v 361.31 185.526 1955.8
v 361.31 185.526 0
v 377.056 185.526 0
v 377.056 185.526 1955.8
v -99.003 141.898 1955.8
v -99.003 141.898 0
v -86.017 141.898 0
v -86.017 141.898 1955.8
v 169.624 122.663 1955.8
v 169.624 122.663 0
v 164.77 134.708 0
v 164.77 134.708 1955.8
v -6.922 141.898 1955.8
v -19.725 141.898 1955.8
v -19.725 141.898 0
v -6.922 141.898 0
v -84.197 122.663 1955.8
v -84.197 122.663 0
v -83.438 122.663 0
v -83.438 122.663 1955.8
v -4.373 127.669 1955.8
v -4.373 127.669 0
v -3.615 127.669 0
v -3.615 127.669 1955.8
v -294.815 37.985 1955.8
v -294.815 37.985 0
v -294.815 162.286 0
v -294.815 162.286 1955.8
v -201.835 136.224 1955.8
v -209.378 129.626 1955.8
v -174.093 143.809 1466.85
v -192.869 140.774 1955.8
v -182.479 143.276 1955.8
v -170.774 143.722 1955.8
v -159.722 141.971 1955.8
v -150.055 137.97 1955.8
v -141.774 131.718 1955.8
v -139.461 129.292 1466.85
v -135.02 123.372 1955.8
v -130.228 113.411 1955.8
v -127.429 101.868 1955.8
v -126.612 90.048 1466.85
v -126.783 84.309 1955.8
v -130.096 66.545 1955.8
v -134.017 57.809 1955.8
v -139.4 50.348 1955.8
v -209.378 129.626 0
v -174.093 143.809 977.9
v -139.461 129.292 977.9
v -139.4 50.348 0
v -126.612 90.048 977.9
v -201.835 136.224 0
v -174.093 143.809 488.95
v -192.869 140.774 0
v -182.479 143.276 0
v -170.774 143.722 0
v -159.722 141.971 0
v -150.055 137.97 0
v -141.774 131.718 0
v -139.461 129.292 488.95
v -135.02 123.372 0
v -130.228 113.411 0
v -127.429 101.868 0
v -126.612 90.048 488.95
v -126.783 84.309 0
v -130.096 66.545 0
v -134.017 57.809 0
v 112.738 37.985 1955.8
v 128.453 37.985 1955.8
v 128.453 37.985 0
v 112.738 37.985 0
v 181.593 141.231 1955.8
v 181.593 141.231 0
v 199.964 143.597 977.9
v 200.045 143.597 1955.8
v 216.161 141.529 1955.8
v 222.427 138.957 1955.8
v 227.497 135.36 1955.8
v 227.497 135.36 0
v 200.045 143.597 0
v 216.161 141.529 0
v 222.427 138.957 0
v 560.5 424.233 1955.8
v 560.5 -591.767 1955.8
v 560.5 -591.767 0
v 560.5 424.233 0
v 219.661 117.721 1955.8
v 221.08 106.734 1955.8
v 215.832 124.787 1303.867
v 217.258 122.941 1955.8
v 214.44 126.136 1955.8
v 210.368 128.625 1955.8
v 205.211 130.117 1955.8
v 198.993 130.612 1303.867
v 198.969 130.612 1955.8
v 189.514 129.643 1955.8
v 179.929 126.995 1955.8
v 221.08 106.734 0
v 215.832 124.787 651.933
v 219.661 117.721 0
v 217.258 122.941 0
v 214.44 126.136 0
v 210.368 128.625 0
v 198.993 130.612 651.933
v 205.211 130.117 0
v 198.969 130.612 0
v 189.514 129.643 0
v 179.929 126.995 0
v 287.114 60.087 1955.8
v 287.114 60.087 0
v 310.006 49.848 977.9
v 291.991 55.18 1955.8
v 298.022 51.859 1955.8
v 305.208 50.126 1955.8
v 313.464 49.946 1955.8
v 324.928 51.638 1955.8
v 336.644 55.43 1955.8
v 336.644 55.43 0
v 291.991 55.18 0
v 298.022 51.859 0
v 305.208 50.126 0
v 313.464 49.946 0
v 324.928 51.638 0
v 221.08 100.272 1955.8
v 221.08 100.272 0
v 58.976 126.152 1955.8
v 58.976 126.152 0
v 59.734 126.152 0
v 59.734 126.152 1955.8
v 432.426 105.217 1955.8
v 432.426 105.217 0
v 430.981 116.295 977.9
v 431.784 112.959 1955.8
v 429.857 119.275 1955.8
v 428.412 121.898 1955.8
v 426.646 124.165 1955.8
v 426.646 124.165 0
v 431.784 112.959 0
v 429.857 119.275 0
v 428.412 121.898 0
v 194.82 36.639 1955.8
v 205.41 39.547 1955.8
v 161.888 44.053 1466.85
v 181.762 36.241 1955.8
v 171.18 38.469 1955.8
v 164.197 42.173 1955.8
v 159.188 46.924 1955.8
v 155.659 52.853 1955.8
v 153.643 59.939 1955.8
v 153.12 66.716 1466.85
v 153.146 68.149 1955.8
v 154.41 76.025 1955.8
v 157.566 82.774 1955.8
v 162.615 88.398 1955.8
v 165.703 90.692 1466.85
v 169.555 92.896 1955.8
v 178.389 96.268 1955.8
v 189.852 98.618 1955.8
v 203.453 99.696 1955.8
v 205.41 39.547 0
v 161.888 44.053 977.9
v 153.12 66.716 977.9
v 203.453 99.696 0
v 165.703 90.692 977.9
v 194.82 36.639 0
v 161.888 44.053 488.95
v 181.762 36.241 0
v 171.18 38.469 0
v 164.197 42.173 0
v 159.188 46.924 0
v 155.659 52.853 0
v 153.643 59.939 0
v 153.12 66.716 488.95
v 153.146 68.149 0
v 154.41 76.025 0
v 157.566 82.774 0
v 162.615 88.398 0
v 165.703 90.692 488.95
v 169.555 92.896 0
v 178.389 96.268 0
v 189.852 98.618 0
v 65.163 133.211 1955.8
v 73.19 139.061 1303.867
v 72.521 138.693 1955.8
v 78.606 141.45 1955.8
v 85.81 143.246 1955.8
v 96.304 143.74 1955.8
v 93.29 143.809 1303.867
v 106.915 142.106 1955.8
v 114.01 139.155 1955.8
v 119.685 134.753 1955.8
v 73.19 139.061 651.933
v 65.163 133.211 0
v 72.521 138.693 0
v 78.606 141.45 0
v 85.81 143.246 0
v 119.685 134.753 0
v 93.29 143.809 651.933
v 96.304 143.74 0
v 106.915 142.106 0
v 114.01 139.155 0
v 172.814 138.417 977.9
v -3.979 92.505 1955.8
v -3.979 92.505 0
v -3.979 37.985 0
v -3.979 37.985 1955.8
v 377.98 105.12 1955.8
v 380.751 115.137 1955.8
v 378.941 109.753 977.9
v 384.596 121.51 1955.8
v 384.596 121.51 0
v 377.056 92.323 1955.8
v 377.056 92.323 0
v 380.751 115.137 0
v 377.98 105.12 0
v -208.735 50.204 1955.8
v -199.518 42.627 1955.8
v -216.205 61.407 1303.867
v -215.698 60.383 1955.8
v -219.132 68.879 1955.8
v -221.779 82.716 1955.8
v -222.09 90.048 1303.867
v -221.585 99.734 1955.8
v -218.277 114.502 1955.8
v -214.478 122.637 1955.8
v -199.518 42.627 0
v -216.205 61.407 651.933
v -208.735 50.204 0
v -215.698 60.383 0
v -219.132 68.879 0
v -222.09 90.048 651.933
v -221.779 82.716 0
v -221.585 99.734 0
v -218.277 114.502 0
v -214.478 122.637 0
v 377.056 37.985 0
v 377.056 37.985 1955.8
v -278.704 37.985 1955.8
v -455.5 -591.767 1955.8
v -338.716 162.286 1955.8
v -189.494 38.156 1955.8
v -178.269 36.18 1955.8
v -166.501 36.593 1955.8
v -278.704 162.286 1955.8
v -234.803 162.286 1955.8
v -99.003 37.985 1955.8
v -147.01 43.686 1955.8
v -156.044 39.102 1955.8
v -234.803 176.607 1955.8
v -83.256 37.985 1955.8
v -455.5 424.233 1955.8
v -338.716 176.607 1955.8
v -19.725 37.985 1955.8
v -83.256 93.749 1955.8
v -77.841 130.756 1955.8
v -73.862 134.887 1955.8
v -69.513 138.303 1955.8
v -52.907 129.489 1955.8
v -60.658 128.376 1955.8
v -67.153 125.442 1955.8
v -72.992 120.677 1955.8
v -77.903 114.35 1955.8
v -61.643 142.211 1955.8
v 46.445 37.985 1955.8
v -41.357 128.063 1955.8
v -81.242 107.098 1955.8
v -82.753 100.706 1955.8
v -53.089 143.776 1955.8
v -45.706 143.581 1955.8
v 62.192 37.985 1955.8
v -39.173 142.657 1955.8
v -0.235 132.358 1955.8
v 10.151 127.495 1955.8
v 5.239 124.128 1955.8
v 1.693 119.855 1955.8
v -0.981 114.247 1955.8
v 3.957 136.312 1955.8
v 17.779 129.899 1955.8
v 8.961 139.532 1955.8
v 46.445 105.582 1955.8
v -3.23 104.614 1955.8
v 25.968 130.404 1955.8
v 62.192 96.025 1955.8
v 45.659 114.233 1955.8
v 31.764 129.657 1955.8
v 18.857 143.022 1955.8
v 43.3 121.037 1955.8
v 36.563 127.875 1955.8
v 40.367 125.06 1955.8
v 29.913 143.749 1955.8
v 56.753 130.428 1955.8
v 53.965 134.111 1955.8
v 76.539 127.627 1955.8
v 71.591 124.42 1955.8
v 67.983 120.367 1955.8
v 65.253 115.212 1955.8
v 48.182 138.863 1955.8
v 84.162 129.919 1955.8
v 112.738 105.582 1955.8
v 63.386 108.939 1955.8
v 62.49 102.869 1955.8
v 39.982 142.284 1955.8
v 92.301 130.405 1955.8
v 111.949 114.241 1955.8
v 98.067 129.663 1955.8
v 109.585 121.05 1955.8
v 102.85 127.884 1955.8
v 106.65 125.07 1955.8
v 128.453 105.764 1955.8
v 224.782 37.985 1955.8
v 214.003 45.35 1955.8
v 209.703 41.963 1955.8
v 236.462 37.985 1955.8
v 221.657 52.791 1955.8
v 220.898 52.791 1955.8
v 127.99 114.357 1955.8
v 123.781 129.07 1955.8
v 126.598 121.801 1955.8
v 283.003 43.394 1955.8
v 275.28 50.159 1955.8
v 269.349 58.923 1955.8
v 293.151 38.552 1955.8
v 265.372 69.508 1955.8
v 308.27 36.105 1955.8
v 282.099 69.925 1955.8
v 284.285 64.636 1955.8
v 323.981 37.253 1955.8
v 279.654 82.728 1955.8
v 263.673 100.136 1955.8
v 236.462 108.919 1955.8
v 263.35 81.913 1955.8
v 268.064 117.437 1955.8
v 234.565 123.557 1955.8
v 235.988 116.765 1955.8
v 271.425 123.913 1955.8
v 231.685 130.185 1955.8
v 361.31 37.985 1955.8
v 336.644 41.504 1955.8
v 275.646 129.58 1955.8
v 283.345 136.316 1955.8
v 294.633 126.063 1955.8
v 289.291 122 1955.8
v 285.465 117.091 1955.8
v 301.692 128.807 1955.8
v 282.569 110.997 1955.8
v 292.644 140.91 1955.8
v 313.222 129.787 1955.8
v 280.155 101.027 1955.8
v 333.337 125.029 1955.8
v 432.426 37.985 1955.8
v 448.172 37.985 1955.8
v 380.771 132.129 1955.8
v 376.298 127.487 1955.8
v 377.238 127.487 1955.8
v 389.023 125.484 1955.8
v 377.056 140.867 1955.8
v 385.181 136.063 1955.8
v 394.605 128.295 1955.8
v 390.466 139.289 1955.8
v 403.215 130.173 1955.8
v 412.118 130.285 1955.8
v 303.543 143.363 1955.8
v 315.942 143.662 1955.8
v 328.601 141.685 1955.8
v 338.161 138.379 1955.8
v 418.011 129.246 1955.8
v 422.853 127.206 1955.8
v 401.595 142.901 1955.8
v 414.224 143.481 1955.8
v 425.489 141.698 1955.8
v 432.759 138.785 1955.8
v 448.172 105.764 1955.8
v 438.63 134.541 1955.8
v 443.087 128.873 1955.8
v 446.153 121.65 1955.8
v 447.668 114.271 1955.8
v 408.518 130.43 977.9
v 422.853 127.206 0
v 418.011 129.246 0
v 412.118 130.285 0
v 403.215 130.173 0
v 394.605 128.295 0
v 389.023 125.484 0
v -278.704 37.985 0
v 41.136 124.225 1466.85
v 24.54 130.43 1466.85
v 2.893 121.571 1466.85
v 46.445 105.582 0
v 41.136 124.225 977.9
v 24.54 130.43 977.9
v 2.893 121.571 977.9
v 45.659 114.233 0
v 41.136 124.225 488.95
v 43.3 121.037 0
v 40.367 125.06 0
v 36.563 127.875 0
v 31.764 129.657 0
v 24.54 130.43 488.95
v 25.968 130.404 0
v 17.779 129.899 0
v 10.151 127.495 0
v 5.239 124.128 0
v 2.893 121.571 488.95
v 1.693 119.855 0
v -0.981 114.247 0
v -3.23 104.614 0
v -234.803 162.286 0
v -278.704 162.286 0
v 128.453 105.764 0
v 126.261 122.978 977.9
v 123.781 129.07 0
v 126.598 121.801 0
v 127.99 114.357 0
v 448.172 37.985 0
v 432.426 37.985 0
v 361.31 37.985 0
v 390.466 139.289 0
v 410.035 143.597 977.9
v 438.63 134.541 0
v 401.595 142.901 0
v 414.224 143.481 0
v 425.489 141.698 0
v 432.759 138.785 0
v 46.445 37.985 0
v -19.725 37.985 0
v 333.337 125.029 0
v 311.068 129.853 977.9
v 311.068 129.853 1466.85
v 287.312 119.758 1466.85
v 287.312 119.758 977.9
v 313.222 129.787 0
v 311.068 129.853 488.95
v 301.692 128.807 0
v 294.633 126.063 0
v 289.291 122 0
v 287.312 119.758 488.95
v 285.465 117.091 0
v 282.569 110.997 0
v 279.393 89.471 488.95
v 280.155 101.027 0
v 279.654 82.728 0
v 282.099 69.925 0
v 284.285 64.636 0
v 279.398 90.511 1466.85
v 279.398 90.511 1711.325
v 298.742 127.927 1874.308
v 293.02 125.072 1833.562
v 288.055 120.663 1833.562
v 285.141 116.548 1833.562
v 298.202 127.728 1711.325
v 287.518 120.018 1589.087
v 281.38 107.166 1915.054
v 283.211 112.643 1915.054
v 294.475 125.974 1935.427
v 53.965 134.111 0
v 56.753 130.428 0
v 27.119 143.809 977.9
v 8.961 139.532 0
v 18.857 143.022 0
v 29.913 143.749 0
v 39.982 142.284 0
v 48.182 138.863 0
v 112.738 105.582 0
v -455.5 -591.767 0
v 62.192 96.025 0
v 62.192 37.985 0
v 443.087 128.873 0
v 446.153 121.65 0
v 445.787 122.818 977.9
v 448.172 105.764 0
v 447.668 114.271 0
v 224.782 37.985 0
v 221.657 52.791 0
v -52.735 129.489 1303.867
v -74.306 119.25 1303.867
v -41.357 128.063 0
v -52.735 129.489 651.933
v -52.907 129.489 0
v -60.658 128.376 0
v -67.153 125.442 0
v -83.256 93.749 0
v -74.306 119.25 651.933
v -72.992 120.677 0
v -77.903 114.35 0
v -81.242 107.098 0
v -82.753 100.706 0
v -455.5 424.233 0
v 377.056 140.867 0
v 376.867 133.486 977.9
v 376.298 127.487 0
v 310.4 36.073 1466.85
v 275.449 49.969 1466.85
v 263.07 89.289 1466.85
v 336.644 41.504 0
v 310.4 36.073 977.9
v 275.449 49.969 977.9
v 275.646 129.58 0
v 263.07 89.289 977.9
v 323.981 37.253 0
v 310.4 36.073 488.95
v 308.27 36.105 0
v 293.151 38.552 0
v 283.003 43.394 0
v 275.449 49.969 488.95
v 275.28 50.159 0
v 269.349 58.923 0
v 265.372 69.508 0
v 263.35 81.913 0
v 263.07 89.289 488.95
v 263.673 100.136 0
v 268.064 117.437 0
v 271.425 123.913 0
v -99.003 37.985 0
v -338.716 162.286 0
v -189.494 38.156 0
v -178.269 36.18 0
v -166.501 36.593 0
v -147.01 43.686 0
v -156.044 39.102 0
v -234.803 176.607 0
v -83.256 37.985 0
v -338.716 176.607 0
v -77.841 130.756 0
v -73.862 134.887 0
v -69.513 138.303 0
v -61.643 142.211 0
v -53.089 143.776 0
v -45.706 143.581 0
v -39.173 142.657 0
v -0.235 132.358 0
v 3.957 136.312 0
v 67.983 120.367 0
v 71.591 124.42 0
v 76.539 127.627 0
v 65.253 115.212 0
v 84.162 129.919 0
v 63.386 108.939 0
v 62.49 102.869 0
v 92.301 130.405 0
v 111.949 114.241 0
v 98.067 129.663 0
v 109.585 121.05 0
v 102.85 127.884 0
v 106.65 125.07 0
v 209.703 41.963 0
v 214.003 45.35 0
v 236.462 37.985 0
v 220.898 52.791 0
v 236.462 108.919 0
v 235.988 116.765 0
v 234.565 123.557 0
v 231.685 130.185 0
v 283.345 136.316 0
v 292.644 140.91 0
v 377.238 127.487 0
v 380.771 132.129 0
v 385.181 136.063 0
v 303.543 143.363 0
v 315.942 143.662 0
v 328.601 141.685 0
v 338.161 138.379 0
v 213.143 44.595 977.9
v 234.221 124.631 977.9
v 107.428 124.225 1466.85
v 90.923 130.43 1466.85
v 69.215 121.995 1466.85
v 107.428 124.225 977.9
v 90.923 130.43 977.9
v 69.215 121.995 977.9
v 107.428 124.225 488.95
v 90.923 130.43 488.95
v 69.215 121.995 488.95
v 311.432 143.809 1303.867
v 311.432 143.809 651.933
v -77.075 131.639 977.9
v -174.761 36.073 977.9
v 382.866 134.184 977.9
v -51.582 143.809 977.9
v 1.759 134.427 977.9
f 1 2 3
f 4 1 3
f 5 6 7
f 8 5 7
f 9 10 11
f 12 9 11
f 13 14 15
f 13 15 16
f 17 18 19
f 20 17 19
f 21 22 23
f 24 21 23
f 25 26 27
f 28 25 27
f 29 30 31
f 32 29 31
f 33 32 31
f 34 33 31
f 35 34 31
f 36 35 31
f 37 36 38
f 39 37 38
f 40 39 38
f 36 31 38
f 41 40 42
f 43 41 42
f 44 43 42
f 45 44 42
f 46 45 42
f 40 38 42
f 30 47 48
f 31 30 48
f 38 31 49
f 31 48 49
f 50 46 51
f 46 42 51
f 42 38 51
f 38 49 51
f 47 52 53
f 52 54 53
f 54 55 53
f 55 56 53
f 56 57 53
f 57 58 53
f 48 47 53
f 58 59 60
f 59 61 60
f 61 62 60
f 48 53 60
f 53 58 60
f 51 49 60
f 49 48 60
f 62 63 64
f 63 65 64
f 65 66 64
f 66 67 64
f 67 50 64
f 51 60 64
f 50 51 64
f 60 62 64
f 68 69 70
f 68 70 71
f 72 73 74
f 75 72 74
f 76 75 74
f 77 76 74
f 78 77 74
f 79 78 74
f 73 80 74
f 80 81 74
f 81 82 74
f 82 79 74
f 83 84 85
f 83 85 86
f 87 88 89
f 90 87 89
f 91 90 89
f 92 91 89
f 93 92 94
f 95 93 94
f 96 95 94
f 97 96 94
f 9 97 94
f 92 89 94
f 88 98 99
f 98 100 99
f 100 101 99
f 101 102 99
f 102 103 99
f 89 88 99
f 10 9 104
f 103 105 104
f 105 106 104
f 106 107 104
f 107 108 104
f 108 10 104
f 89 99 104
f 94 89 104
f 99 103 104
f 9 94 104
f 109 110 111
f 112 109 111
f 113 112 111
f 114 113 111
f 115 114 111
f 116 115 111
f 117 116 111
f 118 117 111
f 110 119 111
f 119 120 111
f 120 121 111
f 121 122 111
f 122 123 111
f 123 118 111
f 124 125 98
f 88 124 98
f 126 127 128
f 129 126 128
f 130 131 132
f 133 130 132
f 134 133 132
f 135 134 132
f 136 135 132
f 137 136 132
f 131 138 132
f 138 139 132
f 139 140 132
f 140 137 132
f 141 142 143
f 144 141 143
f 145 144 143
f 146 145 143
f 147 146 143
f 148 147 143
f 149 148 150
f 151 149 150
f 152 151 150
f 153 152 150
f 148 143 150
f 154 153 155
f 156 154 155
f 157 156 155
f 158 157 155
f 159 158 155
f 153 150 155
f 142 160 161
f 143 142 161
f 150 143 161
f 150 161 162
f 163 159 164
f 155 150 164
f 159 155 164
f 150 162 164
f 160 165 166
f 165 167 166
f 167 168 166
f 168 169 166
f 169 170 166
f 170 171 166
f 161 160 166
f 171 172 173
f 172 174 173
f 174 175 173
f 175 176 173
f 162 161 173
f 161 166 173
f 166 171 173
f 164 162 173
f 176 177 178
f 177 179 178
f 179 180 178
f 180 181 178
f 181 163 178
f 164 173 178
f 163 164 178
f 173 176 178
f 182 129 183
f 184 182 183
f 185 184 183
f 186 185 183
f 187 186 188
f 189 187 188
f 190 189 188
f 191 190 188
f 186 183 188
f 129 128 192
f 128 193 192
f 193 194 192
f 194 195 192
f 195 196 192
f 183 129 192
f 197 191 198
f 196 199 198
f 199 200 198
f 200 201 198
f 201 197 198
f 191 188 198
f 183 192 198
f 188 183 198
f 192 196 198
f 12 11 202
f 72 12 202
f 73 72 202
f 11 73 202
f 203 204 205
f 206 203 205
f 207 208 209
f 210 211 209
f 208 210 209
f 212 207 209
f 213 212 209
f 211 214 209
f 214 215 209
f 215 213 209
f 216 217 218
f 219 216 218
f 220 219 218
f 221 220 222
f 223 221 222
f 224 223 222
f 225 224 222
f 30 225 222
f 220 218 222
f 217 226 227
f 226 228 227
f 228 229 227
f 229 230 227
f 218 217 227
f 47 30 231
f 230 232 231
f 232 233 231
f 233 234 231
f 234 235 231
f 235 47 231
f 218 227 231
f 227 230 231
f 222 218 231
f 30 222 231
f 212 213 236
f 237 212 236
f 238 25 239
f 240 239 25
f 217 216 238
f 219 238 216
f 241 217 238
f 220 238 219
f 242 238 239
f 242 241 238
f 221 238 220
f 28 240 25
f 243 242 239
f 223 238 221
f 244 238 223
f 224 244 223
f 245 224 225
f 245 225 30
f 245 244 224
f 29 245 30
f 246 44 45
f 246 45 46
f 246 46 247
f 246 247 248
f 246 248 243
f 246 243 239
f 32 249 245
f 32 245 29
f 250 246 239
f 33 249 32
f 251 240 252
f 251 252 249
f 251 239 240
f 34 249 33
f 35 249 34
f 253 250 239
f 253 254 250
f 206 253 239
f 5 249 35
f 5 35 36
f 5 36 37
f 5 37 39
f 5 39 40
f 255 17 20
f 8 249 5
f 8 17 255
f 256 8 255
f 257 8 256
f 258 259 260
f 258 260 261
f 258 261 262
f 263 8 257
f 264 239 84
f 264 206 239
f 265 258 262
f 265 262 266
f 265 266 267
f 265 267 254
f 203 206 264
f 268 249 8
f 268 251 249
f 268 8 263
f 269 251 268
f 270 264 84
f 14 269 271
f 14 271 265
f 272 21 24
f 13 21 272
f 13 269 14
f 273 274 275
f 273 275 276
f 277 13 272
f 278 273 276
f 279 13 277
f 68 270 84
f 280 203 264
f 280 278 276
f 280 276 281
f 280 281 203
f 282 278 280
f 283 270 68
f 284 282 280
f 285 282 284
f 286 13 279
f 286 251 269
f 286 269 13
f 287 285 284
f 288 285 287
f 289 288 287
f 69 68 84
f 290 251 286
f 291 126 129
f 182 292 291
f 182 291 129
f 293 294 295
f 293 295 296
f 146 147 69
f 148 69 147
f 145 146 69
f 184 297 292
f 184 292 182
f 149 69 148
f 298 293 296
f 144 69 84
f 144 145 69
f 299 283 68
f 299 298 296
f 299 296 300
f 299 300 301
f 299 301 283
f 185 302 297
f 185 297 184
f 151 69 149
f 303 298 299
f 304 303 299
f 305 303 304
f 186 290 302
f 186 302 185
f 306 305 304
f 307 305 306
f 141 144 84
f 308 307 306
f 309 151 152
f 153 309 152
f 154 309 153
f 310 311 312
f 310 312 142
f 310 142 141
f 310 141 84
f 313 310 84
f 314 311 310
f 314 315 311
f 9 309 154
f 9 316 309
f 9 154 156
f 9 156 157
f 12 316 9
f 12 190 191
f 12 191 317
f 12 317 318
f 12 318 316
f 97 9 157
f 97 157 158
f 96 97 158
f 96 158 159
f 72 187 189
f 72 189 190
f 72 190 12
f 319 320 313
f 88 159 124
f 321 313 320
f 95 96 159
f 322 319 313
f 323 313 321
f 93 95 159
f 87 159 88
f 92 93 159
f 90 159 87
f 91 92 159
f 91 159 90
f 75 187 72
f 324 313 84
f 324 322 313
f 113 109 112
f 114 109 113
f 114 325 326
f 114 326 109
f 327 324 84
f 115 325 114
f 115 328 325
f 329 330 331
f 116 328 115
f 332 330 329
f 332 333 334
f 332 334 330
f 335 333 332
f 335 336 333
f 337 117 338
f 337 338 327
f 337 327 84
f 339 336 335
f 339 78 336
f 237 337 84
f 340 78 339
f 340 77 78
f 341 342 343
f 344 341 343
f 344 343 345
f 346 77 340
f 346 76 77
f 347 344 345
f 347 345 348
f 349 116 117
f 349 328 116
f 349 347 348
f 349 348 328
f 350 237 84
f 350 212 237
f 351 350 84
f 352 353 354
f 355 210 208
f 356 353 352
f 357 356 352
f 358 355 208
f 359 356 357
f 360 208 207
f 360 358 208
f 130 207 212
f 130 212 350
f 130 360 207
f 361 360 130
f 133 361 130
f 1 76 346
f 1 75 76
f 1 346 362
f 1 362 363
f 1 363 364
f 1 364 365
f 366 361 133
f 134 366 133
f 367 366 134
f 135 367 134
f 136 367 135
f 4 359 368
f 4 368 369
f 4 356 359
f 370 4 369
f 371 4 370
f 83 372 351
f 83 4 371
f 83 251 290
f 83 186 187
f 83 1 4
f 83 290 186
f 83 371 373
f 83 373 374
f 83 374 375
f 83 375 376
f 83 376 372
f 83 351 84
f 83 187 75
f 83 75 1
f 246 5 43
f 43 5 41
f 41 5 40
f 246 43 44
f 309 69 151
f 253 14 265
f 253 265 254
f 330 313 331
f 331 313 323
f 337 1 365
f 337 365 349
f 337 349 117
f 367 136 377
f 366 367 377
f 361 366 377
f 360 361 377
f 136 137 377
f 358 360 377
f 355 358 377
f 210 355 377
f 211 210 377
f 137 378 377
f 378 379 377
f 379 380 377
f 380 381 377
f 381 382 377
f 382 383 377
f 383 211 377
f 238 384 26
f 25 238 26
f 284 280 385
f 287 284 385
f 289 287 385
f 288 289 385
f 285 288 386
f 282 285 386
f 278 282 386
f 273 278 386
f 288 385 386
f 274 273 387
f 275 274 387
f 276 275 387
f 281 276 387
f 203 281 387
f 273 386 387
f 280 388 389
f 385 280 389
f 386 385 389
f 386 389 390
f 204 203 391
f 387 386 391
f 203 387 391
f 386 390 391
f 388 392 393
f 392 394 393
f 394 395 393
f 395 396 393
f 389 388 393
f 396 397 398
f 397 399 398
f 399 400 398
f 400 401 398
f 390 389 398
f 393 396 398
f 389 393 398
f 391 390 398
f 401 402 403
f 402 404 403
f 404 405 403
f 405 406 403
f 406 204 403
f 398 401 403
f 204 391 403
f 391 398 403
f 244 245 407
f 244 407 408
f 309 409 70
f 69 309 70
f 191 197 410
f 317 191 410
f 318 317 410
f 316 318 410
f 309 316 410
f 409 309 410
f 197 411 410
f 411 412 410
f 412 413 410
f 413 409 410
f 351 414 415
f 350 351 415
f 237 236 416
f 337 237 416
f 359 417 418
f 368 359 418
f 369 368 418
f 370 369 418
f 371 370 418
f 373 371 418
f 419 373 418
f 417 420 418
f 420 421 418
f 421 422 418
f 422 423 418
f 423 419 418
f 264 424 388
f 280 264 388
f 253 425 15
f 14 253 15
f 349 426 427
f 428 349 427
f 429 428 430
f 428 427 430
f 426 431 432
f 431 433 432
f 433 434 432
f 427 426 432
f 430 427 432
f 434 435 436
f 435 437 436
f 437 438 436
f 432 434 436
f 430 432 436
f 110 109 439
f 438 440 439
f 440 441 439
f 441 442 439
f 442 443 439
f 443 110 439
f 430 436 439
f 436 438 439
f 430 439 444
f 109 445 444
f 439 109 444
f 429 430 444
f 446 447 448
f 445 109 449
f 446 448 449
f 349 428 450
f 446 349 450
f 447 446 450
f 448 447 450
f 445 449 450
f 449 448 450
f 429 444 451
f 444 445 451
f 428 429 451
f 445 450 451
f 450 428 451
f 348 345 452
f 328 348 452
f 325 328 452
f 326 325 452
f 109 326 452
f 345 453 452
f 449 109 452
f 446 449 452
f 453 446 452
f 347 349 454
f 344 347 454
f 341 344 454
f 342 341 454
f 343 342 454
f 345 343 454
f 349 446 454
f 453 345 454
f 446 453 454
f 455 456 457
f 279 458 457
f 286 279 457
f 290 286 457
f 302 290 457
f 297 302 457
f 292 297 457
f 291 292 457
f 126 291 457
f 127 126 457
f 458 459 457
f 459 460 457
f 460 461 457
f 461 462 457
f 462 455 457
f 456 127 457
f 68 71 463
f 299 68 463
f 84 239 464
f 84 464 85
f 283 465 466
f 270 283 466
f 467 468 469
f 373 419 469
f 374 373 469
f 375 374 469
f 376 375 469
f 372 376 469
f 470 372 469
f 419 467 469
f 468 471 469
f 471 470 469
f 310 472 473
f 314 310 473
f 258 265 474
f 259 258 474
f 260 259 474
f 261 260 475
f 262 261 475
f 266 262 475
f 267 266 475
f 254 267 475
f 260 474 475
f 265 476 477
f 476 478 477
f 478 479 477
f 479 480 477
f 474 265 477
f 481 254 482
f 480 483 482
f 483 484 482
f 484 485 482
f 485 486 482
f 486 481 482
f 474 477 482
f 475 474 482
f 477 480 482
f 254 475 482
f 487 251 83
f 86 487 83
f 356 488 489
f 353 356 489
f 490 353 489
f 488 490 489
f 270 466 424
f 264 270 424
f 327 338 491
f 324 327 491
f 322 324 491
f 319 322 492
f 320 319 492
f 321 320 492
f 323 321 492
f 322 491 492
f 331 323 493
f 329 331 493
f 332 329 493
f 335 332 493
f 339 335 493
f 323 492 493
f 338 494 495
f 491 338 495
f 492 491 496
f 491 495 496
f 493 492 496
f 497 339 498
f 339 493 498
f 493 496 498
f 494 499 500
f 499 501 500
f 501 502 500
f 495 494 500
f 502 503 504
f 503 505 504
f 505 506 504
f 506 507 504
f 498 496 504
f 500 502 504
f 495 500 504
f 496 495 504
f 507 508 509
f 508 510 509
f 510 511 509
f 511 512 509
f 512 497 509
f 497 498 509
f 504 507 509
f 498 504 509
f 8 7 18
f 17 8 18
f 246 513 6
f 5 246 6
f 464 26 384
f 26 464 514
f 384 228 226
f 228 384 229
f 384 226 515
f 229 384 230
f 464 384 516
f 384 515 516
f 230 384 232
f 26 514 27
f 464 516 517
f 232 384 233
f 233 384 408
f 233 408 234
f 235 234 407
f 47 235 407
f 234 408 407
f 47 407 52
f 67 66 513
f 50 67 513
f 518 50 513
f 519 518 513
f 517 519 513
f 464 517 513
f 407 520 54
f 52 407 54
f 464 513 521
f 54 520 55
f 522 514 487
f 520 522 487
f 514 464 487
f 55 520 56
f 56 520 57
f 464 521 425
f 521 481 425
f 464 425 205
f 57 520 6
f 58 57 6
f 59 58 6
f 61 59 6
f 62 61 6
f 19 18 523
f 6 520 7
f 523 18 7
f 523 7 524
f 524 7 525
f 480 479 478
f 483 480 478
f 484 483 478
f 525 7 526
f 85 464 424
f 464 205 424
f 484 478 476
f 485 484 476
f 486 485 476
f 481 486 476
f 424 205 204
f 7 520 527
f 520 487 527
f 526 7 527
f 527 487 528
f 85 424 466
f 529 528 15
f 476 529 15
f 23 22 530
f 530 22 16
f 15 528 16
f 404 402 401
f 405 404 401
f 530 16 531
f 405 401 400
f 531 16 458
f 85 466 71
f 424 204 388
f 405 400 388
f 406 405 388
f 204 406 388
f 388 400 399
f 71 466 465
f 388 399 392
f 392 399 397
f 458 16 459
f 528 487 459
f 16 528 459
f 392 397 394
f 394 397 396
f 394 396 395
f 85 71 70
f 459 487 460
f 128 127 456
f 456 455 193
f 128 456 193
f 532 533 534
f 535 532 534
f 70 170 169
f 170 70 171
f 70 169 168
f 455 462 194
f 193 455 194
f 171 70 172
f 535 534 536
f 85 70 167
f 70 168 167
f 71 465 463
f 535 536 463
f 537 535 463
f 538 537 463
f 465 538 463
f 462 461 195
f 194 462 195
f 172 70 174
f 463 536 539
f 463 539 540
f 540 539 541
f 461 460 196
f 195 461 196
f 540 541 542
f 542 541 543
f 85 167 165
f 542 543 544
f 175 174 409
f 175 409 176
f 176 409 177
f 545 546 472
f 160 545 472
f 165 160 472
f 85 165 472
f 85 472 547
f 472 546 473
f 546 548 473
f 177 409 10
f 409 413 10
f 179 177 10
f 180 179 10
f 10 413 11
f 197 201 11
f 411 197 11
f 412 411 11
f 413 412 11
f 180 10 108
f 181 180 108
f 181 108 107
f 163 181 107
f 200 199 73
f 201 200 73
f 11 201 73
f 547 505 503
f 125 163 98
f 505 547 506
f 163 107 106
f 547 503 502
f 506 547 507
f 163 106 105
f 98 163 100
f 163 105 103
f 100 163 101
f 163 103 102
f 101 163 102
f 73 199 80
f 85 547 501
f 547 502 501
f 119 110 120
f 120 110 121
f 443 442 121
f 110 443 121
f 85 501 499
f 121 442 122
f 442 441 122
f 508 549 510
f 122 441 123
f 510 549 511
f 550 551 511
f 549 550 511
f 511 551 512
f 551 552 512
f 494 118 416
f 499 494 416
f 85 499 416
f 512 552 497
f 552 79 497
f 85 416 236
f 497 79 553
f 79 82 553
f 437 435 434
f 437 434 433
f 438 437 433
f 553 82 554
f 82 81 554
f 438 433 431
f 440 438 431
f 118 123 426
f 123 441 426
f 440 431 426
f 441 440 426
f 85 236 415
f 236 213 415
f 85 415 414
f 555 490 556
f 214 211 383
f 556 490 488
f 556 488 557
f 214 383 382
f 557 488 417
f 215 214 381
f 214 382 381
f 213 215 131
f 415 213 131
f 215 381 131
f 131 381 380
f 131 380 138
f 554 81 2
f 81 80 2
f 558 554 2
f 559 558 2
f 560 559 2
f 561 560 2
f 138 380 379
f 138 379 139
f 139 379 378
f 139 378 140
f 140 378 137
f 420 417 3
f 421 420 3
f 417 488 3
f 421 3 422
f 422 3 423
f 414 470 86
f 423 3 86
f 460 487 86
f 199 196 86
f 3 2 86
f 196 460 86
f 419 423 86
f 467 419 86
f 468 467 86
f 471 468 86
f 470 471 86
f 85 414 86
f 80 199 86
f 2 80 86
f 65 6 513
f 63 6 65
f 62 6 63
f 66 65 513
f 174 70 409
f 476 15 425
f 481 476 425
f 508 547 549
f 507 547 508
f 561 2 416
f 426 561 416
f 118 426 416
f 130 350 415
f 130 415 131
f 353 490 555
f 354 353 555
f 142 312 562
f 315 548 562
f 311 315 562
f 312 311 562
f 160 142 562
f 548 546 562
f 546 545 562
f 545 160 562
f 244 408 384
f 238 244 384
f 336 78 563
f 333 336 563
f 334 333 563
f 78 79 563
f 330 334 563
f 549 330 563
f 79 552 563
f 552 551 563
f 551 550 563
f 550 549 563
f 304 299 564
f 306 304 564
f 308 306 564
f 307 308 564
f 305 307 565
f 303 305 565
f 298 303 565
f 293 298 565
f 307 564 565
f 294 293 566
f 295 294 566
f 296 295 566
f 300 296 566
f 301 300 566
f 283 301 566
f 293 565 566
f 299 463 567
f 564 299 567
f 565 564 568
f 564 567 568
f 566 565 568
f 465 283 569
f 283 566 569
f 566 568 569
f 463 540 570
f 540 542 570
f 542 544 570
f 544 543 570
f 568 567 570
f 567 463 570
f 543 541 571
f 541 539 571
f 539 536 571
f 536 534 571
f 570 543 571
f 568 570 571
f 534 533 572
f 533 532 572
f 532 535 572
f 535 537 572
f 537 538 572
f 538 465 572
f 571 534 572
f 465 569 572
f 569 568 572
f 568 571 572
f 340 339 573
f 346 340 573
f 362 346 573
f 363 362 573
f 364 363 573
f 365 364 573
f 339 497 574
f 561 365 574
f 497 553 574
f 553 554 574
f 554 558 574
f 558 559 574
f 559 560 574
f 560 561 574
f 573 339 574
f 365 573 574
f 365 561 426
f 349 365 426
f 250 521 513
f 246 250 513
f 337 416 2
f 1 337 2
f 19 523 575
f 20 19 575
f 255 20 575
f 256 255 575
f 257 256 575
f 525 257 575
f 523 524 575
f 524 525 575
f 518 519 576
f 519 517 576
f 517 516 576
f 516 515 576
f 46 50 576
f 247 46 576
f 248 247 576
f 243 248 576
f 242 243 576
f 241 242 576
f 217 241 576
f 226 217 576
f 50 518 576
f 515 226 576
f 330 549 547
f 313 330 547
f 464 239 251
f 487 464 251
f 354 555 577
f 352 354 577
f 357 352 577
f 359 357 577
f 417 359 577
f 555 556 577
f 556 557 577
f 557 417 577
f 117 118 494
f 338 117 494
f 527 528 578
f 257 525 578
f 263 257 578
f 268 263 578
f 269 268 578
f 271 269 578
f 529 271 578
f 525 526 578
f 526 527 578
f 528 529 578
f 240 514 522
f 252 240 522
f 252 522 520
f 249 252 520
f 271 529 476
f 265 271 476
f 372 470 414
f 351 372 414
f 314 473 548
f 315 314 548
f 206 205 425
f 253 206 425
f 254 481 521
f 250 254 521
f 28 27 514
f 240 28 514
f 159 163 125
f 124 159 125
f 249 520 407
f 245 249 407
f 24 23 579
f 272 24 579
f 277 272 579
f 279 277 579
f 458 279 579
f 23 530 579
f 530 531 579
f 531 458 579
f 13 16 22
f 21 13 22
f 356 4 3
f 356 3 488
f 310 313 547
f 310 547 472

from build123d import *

# Parameters (mm, degrees)
F0_W     = 1016
F0_H     = 1016
F1_DEPTH = 1955.8


with BuildPart() as f1:
    # F0 (on Top) → F1 (new body)
    with BuildSketch(Plane.XY):
        with Locations((52.5003295943, -83.767197299)):
            Rectangle(F0_W, F0_H)
        Polygon((-278.7042081327, 162.2862787117), (-278.7042081327, 37.9848740995), (-294.8145439514, 37.9848740995), (-294.8145439514, 162.2862787117), (-338.7159675476, 162.2862787117), (-338.7159675476, 176.6065772172), (-234.8027845364, 176.6065772172), (-234.8027845364, 162.2862787117), align=None, mode=Mode.SUBTRACT)
        with BuildLine():
            add(Edge.make_bspline(
                [(-139.4605428977, 129.2919468797), (-126.6117157429, 114.7744408736), (-126.6117157429, 90.0476542593)],
                knots=[0, 0, 0, 1, 1, 1], degree=2))
            add(Edge.make_bspline(
                [(-126.6117157429, 90.0476542593), (-126.6117157429, 64.6230564889), (-139.3998636668, 50.3482674067)],
                knots=[0, 0, 0, 1, 1, 1], degree=2))
            add(Edge.make_bspline(
                [(-139.3998636668, 50.3482674067), (-152.1880115906, 36.0734783244), (-174.760685506, 36.0734783244)],
                knots=[0, 0, 0, 1, 1, 1], degree=2))
            add(Edge.make_bspline(
                [(-174.760685506, 36.0734783244), (-188.7169086258, 36.0734783244), (-199.5178117359, 42.6268352676)],
                knots=[0, 0, 0, 1, 1, 1], degree=2))
            add(Edge.make_bspline(
                [(-199.5178117359, 42.6268352676), (-210.3187148459, 49.1801922108), (-216.2046002486, 61.4070572483)],
                knots=[0, 0, 0, 1, 1, 1], degree=2))
            add(Edge.make_bspline(
                [(-216.2046002486, 61.4070572483), (-222.0904856513, 73.6339222858), (-222.0904856513, 90.0476542593)],
                knots=[0, 0, 0, 1, 1, 1], degree=2))
            add(Edge.make_bspline(
                [(-222.0904856513, 90.0476542593), (-222.0904856513, 115.4419124141), (-209.3781867661, 129.6256826499)],
                knots=[0, 0, 0, 1, 1, 1], degree=2))
            add(Edge.make_bspline(
                [(-209.3781867661, 129.6256826499), (-196.665887881, 143.8094528858), (-174.0932139655, 143.8094528858)],
                knots=[0, 0, 0, 1, 1, 1], degree=2))
            add(Edge.make_bspline(
                [(-174.0932139655, 143.8094528858), (-152.3093700525, 143.8094528858), (-139.4605428977, 129.2919468797)],
                knots=[0, 0, 0, 1, 1, 1], degree=2))
        make_face(mode=Mode.SUBTRACT)
        with BuildLine():
            add(Edge.make_bspline(
                [(-69.5125594139, 138.3028126766), (-61.3512028503, 143.8094528858), (-51.5818466665, 143.8094528858)],
                knots=[0, 0, 0, 1, 1, 1], degree=2))
            add(Edge.make_bspline(
                [(-51.5818466665, 143.8094528858), (-44.6644143376, 143.8094528858), (-39.1729439361, 142.6565474976)],
                knots=[0, 0, 0, 1, 1, 1], degree=2))
            Line((-39.1729439361, 142.6565474976), (-41.3573962505, 128.0631924528))
            add(Edge.make_bspline(
                [(-41.3573962505, 128.0631924528), (-47.7893947318, 129.4891543803), (-52.7347520547, 129.4891543803)],
                knots=[0, 0, 0, 1, 1, 1], degree=2))
            add(Edge.make_bspline(
                [(-52.7347520547, 129.4891543803), (-65.3560320934, 129.4891543803), (-74.3062186593, 119.2495341566)],
                knots=[0, 0, 0, 1, 1, 1], degree=2))
            add(Edge.make_bspline(
                [(-74.3062186593, 119.2495341566), (-83.2564052253, 109.0099139328), (-83.2564052253, 93.7490873475)],
                knots=[0, 0, 0, 1, 1, 1], degree=2))
            Line((-83.2564052253, 93.7490873475), (-83.2564052253, 37.9848740995))
            Line((-83.2564052253, 37.9848740995), (-99.0026656582, 37.9848740995))
            Line((-99.0026656582, 37.9848740995), (-99.0026656582, 141.8980571107))
            Line((-99.0026656582, 141.8980571107), (-86.0173102337, 141.8980571107))
            Line((-86.0173102337, 141.8980571107), (-84.1969333051, 122.6627408978))
            Line((-84.1969333051, 122.6627408978), (-83.4384429181, 122.6627408978))
            add(Edge.make_bspline(
                [(-83.4384429181, 122.6627408978), (-77.6739159774, 132.7961724674), (-69.5125594139, 138.3028126766)],
                knots=[0, 0, 0, 1, 1, 1], degree=2))
        make_face(mode=Mode.SUBTRACT)
        with BuildLine():
            Line((128.4534315782, 37.9848740995), (112.7375107608, 37.9848740995))
            Line((112.7375107608, 37.9848740995), (112.7375107608, 105.5815373838))
            add(Edge.make_bspline(
                [(112.7375107608, 105.5815373838), (112.7375107608, 118.0207797297), (107.4280780522, 124.2252310949)],
                knots=[0, 0, 0, 1, 1, 1], degree=2))
            add(Edge.make_bspline(
                [(107.4280780522, 124.2252310949), (102.1186453436, 130.4296824601), (90.9233272323, 130.4296824601)],
                knots=[0, 0, 0, 1, 1, 1], degree=2))
            add(Edge.make_bspline(
                [(90.9233272323, 130.4296824601), (76.2389533411, 130.4296824601), (69.215332358, 121.9952693573)],
                knots=[0, 0, 0, 1, 1, 1], degree=2))
            add(Edge.make_bspline(
                [(69.215332358, 121.9952693573), (62.1917113749, 113.5608562545), (62.1917113749, 96.0245585084)],
                knots=[0, 0, 0, 1, 1, 1], degree=2))
            Line((62.1917113749, 96.0245585084), (62.1917113749, 37.9848740995))
            Line((62.1917113749, 37.9848740995), (46.445450942, 37.9848740995))
            Line((46.445450942, 37.9848740995), (46.445450942, 105.5815373838))
            add(Edge.make_bspline(
                [(46.445450942, 105.5815373838), (46.445450942, 118.0207797297), (41.1360182334, 124.2252310949)],
                knots=[0, 0, 0, 1, 1, 1], degree=2))
            add(Edge.make_bspline(
                [(41.1360182334, 124.2252310949), (35.8265855248, 130.4296824601), (24.5402485671, 130.4296824601)],
                knots=[0, 0, 0, 1, 1, 1], degree=2))
            add(Edge.make_bspline(
                [(24.5402485671, 130.4296824601), (9.7648558294, 130.4296824601), (2.8929329237, 121.5705147406)],
                knots=[0, 0, 0, 1, 1, 1], degree=2))
            add(Edge.make_bspline(
                [(2.8929329237, 121.5705147406), (-3.978989982, 112.7113470211), (-3.978989982, 92.5051631129)],
                knots=[0, 0, 0, 1, 1, 1], degree=2))
            Line((-3.978989982, 92.5051631129), (-3.978989982, 37.9848740995))
            Line((-3.978989982, 37.9848740995), (-19.7252504149, 37.9848740995))
            Line((-19.7252504149, 37.9848740995), (-19.7252504149, 141.8980571107))
            Line((-19.7252504149, 141.8980571107), (-6.9219326833, 141.8980571107))
            Line((-6.9219326833, 141.8980571107), (-4.3734049832, 127.6687774516))
            Line((-4.3734049832, 127.6687774516), (-3.6149145963, 127.6687774516))
            add(Edge.make_bspline(
                [(-3.6149145963, 127.6687774516), (0.845008879, 135.253681321), (8.9608560193, 139.5315671034)],
                knots=[0, 0, 0, 1, 1, 1], degree=2))
            add(Edge.make_bspline(
                [(8.9608560193, 139.5315671034), (17.0767031595, 143.8094528858), (27.1191158827, 143.8094528858)],
                knots=[0, 0, 0, 1, 1, 1], degree=2))
            add(Edge.make_bspline(
                [(27.1191158827, 143.8094528858), (51.4818271113, 143.8094528858), (58.9757121343, 126.1517966777)],
                knots=[0, 0, 0, 1, 1, 1], degree=2))
            Line((58.9757121343, 126.1517966777), (59.7342025212, 126.1517966777))
            add(Edge.make_bspline(
                [(59.7342025212, 126.1517966777), (64.3761636893, 134.3131532412), (73.1898219856, 139.0613030635)],
                knots=[0, 0, 0, 1, 1, 1], degree=2))
            add(Edge.make_bspline(
                [(73.1898219856, 139.0613030635), (82.0034802819, 143.8094528858), (93.2898172396, 143.8094528858)],
                knots=[0, 0, 0, 1, 1, 1], degree=2))
            add(Edge.make_bspline(
                [(93.2898172396, 143.8094528858), (110.9171338321, 143.8094528858), (119.6852827052, 134.7530776657)],
                knots=[0, 0, 0, 1, 1, 1], degree=2))
            add(Edge.make_bspline(
                [(119.6852827052, 134.7530776657), (128.4534315782, 125.6967024456), (128.4534315782, 105.7635750767)],
                knots=[0, 0, 0, 1, 1, 1], degree=2))
            Line((128.4534315782, 105.7635750767), (128.4534315782, 37.9848740995))
        make_face(mode=Mode.SUBTRACT)
        with BuildLine():
            Line((236.4624626789, 37.9848740995), (224.78171072, 37.9848740995))
            Line((224.78171072, 37.9848740995), (221.6567303258, 52.7906064526))
            Line((221.6567303258, 52.7906064526), (220.8982399388, 52.7906064526))
            add(Edge.make_bspline(
                [(220.8982399388, 52.7906064526), (213.1312983765, 43.0212502688), (205.4098662375, 39.5473642966)],
                knots=[0, 0, 0, 1, 1, 1], degree=2))
            add(Edge.make_bspline(
                [(205.4098662375, 39.5473642966), (197.6884340984, 36.0734783244), (186.0987009859, 36.0734783244)],
                knots=[0, 0, 0, 1, 1, 1], degree=2))
            add(Edge.make_bspline(
                [(186.0987009859, 36.0734783244), (170.6558367077, 36.0734783244), (161.8876878347, 44.052797195)],
                knots=[0, 0, 0, 1, 1, 1], degree=2))
            add(Edge.make_bspline(
                [(161.8876878347, 44.052797195), (153.1195389616, 52.0321160657), (153.1195389616, 66.7164899569)],
                knots=[0, 0, 0, 1, 1, 1], degree=2))
            add(Edge.make_bspline(
                [(153.1195389616, 66.7164899569), (153.1195389616, 98.1786712073), (203.4529610391, 99.6956519812)],
                knots=[0, 0, 0, 1, 1, 1], degree=2))
            Line((203.4529610391, 99.6956519812), (221.0802776317, 100.2721046752))
            Line((221.0802776317, 100.2721046752), (221.0802776317, 106.734442772))
            add(Edge.make_bspline(
                [(221.0802776317, 106.734442772), (221.0802776317, 118.9613078095), (215.8315241541, 124.7865139812)],
                knots=[0, 0, 0, 1, 1, 1], degree=2))
            add(Edge.make_bspline(
                [(215.8315241541, 124.7865139812), (210.5827706764, 130.611720153), (198.9930375639, 130.611720153)],
                knots=[0, 0, 0, 1, 1, 1], degree=2))
            add(Edge.make_bspline(
                [(198.9930375639, 130.611720153), (186.0076821395, 130.611720153), (169.6242897815, 122.6627408978)],
                knots=[0, 0, 0, 1, 1, 1], degree=2))
            Line((169.6242897815, 122.6627408978), (164.7699513051, 134.7075682424))
            add(Edge.make_bspline(
                [(164.7699513051, 134.7075682424), (172.4458740209, 138.8640955629), (181.5932680875, 141.2305855702)],
                knots=[0, 0, 0, 1, 1, 1], degree=2))
            add(Edge.make_bspline(
                [(181.5932680875, 141.2305855702), (190.740662154, 143.5970755774), (199.9639052592, 143.5970755774)],
                knots=[0, 0, 0, 1, 1, 1], degree=2))
            add(Edge.make_bspline(
                [(199.9639052592, 143.5970755774), (218.5317499316, 143.5970755774), (227.4971063052, 135.3598699752)],
                knots=[0, 0, 0, 1, 1, 1], degree=2))
            add(Edge.make_bspline(
                [(227.4971063052, 135.3598699752), (236.4624626789, 127.122664373), (236.4624626789, 108.9188950864)],
                knots=[0, 0, 0, 1, 1, 1], degree=2))
            Line((236.4624626789, 108.9188950864), (236.4624626789, 37.9848740995))
        make_face(mode=Mode.SUBTRACT)
        with BuildLine():
            add(Edge.make_bspline(
                [(336.6438729863, 41.5042694949), (326.2373848775, 36.0734783244), (310.4001055981, 36.0734783244)],
                knots=[0, 0, 0, 1, 1, 1], degree=2))
            add(Edge.make_bspline(
                [(310.4001055981, 36.0734783244), (287.8274316827, 36.0734783244), (275.4488685678, 49.9690222132)],
                knots=[0, 0, 0, 1, 1, 1], degree=2))
            add(Edge.make_bspline(
                [(275.4488685678, 49.9690222132), (263.0703054529, 63.864566102), (263.0703054529, 89.2891638723)],
                knots=[0, 0, 0, 1, 1, 1], degree=2))
            add(Edge.make_bspline(
                [(263.0703054529, 89.2891638723), (263.0703054529, 115.3508935677), (275.6460760684, 129.5801732267)],
                knots=[0, 0, 0, 1, 1, 1], degree=2))
            add(Edge.make_bspline(
                [(275.6460760684, 129.5801732267), (288.2218466839, 143.8094528858), (311.4316525243, 143.8094528858)],
                knots=[0, 0, 0, 1, 1, 1], degree=2))
            add(Edge.make_bspline(
                [(311.4316525243, 143.8094528858), (318.9255375473, 143.8094528858), (326.4194225703, 142.1862834577)],
                knots=[0, 0, 0, 1, 1, 1], degree=2))
            add(Edge.make_bspline(
                [(326.4194225703, 142.1862834577), (333.9133075933, 140.5631140296), (338.1608537602, 138.3786617153)],
                knots=[0, 0, 0, 1, 1, 1], degree=2))
            Line((338.1608537602, 138.3786617153), (333.3368548992, 125.0292309051))
            add(Edge.make_bspline(
                [(333.3368548992, 125.0292309051), (328.1184410371, 127.122664373), (321.9594990951, 128.4879470695)],
                knots=[0, 0, 0, 1, 1, 1], degree=2))
            add(Edge.make_bspline(
                [(321.9594990951, 128.4879470695), (315.8005571531, 129.853229766), (311.0675771386, 129.853229766)],
                knots=[0, 0, 0, 1, 1, 1], degree=2))
            add(Edge.make_bspline(
                [(311.0675771386, 129.853229766), (279.3930185799, 129.853229766), (279.3930185799, 89.4712015652)],
                knots=[0, 0, 0, 1, 1, 1], degree=2))
            add(Edge.make_bspline(
                [(279.3930185799, 89.4712015652), (279.3930185799, 70.3269041987), (287.1144507189, 60.087283975)],
                knots=[0, 0, 0, 1, 1, 1], degree=2))
            add(Edge.make_bspline(
                [(287.1144507189, 60.087283975), (294.835882858, 49.8476637513), (310.0056905969, 49.8476637513)],
                knots=[0, 0, 0, 1, 1, 1], degree=2))
            add(Edge.make_bspline(
                [(310.0056905969, 49.8476637513), (322.9910460213, 49.8476637513), (336.6438729863, 55.4301529992)],
                knots=[0, 0, 0, 1, 1, 1], degree=2))
            Line((336.6438729863, 55.4301529992), (336.6438729863, 41.5042694949))
        make_face(mode=Mode.SUBTRACT)
        with BuildLine():
            Line((448.1722994824, 37.9848740995), (432.4260390495, 37.9848740995))
            Line((432.4260390495, 37.9848740995), (432.4260390495, 105.2174619981))
            add(Edge.make_bspline(
                [(432.4260390495, 105.2174619981), (432.4260390495, 117.8994212678), (426.646342301, 124.1645518639)],
                knots=[0, 0, 0, 1, 1, 1], degree=2))
            add(Edge.make_bspline(
                [(426.646342301, 124.1645518639), (420.8666455525, 130.4296824601), (408.518422053, 130.4296824601)],
                knots=[0, 0, 0, 1, 1, 1], degree=2))
            add(Edge.make_bspline(
                [(408.518422053, 130.4296824601), (392.1350296951, 130.4296824601), (384.5956352488, 121.5098355096)],
                knots=[0, 0, 0, 1, 1, 1], degree=2))
            add(Edge.make_bspline(
                [(384.5956352488, 121.5098355096), (377.0562408026, 112.5899885592), (377.0562408026, 92.3231254201)],
                knots=[0, 0, 0, 1, 1, 1], degree=2))
            Line((377.0562408026, 92.3231254201), (377.0562408026, 37.9848740995))
            Line((377.0562408026, 37.9848740995), (361.3099803697, 37.9848740995))
            Line((361.3099803697, 37.9848740995), (361.3099803697, 185.5264241676))
            Line((361.3099803697, 185.5264241676), (377.0562408026, 185.5264241676))
            Line((377.0562408026, 185.5264241676), (377.0562408026, 140.8665101844))
            add(Edge.make_bspline(
                [(377.0562408026, 140.8665101844), (377.0562408026, 132.7961724674), (376.2977504157, 127.4867397588)],
                knots=[0, 0, 0, 1, 1, 1], degree=2))
            Line((376.2977504157, 127.4867397588), (377.2382784955, 127.4867397588))
            add(Edge.make_bspline(
                [(377.2382784955, 127.4867397588), (381.8802396636, 134.9806247817), (390.4663508438, 139.2888501796)],
                knots=[0, 0, 0, 1, 1, 1], degree=2))
            add(Edge.make_bspline(
                [(390.4663508438, 139.2888501796), (399.052462024, 143.5970755774), (410.0354028269, 143.5970755774)],
                knots=[0, 0, 0, 1, 1, 1], degree=2))
            add(Edge.make_bspline(
                [(410.0354028269, 143.5970755774), (429.0886813469, 143.5970755774), (438.6304904147, 134.5407003573)],
                knots=[0, 0, 0, 1, 1, 1], degree=2))
            add(Edge.make_bspline(
                [(438.6304904147, 134.5407003573), (448.1722994824, 125.4843251372), (448.1722994824, 105.7635750767)],
                knots=[0, 0, 0, 1, 1, 1], degree=2))
            Line((448.1722994824, 105.7635750767), (448.1722994824, 37.9848740995))
        make_face(mode=Mode.SUBTRACT)
    extrude(amount=F1_DEPTH)


solid = f1.part
